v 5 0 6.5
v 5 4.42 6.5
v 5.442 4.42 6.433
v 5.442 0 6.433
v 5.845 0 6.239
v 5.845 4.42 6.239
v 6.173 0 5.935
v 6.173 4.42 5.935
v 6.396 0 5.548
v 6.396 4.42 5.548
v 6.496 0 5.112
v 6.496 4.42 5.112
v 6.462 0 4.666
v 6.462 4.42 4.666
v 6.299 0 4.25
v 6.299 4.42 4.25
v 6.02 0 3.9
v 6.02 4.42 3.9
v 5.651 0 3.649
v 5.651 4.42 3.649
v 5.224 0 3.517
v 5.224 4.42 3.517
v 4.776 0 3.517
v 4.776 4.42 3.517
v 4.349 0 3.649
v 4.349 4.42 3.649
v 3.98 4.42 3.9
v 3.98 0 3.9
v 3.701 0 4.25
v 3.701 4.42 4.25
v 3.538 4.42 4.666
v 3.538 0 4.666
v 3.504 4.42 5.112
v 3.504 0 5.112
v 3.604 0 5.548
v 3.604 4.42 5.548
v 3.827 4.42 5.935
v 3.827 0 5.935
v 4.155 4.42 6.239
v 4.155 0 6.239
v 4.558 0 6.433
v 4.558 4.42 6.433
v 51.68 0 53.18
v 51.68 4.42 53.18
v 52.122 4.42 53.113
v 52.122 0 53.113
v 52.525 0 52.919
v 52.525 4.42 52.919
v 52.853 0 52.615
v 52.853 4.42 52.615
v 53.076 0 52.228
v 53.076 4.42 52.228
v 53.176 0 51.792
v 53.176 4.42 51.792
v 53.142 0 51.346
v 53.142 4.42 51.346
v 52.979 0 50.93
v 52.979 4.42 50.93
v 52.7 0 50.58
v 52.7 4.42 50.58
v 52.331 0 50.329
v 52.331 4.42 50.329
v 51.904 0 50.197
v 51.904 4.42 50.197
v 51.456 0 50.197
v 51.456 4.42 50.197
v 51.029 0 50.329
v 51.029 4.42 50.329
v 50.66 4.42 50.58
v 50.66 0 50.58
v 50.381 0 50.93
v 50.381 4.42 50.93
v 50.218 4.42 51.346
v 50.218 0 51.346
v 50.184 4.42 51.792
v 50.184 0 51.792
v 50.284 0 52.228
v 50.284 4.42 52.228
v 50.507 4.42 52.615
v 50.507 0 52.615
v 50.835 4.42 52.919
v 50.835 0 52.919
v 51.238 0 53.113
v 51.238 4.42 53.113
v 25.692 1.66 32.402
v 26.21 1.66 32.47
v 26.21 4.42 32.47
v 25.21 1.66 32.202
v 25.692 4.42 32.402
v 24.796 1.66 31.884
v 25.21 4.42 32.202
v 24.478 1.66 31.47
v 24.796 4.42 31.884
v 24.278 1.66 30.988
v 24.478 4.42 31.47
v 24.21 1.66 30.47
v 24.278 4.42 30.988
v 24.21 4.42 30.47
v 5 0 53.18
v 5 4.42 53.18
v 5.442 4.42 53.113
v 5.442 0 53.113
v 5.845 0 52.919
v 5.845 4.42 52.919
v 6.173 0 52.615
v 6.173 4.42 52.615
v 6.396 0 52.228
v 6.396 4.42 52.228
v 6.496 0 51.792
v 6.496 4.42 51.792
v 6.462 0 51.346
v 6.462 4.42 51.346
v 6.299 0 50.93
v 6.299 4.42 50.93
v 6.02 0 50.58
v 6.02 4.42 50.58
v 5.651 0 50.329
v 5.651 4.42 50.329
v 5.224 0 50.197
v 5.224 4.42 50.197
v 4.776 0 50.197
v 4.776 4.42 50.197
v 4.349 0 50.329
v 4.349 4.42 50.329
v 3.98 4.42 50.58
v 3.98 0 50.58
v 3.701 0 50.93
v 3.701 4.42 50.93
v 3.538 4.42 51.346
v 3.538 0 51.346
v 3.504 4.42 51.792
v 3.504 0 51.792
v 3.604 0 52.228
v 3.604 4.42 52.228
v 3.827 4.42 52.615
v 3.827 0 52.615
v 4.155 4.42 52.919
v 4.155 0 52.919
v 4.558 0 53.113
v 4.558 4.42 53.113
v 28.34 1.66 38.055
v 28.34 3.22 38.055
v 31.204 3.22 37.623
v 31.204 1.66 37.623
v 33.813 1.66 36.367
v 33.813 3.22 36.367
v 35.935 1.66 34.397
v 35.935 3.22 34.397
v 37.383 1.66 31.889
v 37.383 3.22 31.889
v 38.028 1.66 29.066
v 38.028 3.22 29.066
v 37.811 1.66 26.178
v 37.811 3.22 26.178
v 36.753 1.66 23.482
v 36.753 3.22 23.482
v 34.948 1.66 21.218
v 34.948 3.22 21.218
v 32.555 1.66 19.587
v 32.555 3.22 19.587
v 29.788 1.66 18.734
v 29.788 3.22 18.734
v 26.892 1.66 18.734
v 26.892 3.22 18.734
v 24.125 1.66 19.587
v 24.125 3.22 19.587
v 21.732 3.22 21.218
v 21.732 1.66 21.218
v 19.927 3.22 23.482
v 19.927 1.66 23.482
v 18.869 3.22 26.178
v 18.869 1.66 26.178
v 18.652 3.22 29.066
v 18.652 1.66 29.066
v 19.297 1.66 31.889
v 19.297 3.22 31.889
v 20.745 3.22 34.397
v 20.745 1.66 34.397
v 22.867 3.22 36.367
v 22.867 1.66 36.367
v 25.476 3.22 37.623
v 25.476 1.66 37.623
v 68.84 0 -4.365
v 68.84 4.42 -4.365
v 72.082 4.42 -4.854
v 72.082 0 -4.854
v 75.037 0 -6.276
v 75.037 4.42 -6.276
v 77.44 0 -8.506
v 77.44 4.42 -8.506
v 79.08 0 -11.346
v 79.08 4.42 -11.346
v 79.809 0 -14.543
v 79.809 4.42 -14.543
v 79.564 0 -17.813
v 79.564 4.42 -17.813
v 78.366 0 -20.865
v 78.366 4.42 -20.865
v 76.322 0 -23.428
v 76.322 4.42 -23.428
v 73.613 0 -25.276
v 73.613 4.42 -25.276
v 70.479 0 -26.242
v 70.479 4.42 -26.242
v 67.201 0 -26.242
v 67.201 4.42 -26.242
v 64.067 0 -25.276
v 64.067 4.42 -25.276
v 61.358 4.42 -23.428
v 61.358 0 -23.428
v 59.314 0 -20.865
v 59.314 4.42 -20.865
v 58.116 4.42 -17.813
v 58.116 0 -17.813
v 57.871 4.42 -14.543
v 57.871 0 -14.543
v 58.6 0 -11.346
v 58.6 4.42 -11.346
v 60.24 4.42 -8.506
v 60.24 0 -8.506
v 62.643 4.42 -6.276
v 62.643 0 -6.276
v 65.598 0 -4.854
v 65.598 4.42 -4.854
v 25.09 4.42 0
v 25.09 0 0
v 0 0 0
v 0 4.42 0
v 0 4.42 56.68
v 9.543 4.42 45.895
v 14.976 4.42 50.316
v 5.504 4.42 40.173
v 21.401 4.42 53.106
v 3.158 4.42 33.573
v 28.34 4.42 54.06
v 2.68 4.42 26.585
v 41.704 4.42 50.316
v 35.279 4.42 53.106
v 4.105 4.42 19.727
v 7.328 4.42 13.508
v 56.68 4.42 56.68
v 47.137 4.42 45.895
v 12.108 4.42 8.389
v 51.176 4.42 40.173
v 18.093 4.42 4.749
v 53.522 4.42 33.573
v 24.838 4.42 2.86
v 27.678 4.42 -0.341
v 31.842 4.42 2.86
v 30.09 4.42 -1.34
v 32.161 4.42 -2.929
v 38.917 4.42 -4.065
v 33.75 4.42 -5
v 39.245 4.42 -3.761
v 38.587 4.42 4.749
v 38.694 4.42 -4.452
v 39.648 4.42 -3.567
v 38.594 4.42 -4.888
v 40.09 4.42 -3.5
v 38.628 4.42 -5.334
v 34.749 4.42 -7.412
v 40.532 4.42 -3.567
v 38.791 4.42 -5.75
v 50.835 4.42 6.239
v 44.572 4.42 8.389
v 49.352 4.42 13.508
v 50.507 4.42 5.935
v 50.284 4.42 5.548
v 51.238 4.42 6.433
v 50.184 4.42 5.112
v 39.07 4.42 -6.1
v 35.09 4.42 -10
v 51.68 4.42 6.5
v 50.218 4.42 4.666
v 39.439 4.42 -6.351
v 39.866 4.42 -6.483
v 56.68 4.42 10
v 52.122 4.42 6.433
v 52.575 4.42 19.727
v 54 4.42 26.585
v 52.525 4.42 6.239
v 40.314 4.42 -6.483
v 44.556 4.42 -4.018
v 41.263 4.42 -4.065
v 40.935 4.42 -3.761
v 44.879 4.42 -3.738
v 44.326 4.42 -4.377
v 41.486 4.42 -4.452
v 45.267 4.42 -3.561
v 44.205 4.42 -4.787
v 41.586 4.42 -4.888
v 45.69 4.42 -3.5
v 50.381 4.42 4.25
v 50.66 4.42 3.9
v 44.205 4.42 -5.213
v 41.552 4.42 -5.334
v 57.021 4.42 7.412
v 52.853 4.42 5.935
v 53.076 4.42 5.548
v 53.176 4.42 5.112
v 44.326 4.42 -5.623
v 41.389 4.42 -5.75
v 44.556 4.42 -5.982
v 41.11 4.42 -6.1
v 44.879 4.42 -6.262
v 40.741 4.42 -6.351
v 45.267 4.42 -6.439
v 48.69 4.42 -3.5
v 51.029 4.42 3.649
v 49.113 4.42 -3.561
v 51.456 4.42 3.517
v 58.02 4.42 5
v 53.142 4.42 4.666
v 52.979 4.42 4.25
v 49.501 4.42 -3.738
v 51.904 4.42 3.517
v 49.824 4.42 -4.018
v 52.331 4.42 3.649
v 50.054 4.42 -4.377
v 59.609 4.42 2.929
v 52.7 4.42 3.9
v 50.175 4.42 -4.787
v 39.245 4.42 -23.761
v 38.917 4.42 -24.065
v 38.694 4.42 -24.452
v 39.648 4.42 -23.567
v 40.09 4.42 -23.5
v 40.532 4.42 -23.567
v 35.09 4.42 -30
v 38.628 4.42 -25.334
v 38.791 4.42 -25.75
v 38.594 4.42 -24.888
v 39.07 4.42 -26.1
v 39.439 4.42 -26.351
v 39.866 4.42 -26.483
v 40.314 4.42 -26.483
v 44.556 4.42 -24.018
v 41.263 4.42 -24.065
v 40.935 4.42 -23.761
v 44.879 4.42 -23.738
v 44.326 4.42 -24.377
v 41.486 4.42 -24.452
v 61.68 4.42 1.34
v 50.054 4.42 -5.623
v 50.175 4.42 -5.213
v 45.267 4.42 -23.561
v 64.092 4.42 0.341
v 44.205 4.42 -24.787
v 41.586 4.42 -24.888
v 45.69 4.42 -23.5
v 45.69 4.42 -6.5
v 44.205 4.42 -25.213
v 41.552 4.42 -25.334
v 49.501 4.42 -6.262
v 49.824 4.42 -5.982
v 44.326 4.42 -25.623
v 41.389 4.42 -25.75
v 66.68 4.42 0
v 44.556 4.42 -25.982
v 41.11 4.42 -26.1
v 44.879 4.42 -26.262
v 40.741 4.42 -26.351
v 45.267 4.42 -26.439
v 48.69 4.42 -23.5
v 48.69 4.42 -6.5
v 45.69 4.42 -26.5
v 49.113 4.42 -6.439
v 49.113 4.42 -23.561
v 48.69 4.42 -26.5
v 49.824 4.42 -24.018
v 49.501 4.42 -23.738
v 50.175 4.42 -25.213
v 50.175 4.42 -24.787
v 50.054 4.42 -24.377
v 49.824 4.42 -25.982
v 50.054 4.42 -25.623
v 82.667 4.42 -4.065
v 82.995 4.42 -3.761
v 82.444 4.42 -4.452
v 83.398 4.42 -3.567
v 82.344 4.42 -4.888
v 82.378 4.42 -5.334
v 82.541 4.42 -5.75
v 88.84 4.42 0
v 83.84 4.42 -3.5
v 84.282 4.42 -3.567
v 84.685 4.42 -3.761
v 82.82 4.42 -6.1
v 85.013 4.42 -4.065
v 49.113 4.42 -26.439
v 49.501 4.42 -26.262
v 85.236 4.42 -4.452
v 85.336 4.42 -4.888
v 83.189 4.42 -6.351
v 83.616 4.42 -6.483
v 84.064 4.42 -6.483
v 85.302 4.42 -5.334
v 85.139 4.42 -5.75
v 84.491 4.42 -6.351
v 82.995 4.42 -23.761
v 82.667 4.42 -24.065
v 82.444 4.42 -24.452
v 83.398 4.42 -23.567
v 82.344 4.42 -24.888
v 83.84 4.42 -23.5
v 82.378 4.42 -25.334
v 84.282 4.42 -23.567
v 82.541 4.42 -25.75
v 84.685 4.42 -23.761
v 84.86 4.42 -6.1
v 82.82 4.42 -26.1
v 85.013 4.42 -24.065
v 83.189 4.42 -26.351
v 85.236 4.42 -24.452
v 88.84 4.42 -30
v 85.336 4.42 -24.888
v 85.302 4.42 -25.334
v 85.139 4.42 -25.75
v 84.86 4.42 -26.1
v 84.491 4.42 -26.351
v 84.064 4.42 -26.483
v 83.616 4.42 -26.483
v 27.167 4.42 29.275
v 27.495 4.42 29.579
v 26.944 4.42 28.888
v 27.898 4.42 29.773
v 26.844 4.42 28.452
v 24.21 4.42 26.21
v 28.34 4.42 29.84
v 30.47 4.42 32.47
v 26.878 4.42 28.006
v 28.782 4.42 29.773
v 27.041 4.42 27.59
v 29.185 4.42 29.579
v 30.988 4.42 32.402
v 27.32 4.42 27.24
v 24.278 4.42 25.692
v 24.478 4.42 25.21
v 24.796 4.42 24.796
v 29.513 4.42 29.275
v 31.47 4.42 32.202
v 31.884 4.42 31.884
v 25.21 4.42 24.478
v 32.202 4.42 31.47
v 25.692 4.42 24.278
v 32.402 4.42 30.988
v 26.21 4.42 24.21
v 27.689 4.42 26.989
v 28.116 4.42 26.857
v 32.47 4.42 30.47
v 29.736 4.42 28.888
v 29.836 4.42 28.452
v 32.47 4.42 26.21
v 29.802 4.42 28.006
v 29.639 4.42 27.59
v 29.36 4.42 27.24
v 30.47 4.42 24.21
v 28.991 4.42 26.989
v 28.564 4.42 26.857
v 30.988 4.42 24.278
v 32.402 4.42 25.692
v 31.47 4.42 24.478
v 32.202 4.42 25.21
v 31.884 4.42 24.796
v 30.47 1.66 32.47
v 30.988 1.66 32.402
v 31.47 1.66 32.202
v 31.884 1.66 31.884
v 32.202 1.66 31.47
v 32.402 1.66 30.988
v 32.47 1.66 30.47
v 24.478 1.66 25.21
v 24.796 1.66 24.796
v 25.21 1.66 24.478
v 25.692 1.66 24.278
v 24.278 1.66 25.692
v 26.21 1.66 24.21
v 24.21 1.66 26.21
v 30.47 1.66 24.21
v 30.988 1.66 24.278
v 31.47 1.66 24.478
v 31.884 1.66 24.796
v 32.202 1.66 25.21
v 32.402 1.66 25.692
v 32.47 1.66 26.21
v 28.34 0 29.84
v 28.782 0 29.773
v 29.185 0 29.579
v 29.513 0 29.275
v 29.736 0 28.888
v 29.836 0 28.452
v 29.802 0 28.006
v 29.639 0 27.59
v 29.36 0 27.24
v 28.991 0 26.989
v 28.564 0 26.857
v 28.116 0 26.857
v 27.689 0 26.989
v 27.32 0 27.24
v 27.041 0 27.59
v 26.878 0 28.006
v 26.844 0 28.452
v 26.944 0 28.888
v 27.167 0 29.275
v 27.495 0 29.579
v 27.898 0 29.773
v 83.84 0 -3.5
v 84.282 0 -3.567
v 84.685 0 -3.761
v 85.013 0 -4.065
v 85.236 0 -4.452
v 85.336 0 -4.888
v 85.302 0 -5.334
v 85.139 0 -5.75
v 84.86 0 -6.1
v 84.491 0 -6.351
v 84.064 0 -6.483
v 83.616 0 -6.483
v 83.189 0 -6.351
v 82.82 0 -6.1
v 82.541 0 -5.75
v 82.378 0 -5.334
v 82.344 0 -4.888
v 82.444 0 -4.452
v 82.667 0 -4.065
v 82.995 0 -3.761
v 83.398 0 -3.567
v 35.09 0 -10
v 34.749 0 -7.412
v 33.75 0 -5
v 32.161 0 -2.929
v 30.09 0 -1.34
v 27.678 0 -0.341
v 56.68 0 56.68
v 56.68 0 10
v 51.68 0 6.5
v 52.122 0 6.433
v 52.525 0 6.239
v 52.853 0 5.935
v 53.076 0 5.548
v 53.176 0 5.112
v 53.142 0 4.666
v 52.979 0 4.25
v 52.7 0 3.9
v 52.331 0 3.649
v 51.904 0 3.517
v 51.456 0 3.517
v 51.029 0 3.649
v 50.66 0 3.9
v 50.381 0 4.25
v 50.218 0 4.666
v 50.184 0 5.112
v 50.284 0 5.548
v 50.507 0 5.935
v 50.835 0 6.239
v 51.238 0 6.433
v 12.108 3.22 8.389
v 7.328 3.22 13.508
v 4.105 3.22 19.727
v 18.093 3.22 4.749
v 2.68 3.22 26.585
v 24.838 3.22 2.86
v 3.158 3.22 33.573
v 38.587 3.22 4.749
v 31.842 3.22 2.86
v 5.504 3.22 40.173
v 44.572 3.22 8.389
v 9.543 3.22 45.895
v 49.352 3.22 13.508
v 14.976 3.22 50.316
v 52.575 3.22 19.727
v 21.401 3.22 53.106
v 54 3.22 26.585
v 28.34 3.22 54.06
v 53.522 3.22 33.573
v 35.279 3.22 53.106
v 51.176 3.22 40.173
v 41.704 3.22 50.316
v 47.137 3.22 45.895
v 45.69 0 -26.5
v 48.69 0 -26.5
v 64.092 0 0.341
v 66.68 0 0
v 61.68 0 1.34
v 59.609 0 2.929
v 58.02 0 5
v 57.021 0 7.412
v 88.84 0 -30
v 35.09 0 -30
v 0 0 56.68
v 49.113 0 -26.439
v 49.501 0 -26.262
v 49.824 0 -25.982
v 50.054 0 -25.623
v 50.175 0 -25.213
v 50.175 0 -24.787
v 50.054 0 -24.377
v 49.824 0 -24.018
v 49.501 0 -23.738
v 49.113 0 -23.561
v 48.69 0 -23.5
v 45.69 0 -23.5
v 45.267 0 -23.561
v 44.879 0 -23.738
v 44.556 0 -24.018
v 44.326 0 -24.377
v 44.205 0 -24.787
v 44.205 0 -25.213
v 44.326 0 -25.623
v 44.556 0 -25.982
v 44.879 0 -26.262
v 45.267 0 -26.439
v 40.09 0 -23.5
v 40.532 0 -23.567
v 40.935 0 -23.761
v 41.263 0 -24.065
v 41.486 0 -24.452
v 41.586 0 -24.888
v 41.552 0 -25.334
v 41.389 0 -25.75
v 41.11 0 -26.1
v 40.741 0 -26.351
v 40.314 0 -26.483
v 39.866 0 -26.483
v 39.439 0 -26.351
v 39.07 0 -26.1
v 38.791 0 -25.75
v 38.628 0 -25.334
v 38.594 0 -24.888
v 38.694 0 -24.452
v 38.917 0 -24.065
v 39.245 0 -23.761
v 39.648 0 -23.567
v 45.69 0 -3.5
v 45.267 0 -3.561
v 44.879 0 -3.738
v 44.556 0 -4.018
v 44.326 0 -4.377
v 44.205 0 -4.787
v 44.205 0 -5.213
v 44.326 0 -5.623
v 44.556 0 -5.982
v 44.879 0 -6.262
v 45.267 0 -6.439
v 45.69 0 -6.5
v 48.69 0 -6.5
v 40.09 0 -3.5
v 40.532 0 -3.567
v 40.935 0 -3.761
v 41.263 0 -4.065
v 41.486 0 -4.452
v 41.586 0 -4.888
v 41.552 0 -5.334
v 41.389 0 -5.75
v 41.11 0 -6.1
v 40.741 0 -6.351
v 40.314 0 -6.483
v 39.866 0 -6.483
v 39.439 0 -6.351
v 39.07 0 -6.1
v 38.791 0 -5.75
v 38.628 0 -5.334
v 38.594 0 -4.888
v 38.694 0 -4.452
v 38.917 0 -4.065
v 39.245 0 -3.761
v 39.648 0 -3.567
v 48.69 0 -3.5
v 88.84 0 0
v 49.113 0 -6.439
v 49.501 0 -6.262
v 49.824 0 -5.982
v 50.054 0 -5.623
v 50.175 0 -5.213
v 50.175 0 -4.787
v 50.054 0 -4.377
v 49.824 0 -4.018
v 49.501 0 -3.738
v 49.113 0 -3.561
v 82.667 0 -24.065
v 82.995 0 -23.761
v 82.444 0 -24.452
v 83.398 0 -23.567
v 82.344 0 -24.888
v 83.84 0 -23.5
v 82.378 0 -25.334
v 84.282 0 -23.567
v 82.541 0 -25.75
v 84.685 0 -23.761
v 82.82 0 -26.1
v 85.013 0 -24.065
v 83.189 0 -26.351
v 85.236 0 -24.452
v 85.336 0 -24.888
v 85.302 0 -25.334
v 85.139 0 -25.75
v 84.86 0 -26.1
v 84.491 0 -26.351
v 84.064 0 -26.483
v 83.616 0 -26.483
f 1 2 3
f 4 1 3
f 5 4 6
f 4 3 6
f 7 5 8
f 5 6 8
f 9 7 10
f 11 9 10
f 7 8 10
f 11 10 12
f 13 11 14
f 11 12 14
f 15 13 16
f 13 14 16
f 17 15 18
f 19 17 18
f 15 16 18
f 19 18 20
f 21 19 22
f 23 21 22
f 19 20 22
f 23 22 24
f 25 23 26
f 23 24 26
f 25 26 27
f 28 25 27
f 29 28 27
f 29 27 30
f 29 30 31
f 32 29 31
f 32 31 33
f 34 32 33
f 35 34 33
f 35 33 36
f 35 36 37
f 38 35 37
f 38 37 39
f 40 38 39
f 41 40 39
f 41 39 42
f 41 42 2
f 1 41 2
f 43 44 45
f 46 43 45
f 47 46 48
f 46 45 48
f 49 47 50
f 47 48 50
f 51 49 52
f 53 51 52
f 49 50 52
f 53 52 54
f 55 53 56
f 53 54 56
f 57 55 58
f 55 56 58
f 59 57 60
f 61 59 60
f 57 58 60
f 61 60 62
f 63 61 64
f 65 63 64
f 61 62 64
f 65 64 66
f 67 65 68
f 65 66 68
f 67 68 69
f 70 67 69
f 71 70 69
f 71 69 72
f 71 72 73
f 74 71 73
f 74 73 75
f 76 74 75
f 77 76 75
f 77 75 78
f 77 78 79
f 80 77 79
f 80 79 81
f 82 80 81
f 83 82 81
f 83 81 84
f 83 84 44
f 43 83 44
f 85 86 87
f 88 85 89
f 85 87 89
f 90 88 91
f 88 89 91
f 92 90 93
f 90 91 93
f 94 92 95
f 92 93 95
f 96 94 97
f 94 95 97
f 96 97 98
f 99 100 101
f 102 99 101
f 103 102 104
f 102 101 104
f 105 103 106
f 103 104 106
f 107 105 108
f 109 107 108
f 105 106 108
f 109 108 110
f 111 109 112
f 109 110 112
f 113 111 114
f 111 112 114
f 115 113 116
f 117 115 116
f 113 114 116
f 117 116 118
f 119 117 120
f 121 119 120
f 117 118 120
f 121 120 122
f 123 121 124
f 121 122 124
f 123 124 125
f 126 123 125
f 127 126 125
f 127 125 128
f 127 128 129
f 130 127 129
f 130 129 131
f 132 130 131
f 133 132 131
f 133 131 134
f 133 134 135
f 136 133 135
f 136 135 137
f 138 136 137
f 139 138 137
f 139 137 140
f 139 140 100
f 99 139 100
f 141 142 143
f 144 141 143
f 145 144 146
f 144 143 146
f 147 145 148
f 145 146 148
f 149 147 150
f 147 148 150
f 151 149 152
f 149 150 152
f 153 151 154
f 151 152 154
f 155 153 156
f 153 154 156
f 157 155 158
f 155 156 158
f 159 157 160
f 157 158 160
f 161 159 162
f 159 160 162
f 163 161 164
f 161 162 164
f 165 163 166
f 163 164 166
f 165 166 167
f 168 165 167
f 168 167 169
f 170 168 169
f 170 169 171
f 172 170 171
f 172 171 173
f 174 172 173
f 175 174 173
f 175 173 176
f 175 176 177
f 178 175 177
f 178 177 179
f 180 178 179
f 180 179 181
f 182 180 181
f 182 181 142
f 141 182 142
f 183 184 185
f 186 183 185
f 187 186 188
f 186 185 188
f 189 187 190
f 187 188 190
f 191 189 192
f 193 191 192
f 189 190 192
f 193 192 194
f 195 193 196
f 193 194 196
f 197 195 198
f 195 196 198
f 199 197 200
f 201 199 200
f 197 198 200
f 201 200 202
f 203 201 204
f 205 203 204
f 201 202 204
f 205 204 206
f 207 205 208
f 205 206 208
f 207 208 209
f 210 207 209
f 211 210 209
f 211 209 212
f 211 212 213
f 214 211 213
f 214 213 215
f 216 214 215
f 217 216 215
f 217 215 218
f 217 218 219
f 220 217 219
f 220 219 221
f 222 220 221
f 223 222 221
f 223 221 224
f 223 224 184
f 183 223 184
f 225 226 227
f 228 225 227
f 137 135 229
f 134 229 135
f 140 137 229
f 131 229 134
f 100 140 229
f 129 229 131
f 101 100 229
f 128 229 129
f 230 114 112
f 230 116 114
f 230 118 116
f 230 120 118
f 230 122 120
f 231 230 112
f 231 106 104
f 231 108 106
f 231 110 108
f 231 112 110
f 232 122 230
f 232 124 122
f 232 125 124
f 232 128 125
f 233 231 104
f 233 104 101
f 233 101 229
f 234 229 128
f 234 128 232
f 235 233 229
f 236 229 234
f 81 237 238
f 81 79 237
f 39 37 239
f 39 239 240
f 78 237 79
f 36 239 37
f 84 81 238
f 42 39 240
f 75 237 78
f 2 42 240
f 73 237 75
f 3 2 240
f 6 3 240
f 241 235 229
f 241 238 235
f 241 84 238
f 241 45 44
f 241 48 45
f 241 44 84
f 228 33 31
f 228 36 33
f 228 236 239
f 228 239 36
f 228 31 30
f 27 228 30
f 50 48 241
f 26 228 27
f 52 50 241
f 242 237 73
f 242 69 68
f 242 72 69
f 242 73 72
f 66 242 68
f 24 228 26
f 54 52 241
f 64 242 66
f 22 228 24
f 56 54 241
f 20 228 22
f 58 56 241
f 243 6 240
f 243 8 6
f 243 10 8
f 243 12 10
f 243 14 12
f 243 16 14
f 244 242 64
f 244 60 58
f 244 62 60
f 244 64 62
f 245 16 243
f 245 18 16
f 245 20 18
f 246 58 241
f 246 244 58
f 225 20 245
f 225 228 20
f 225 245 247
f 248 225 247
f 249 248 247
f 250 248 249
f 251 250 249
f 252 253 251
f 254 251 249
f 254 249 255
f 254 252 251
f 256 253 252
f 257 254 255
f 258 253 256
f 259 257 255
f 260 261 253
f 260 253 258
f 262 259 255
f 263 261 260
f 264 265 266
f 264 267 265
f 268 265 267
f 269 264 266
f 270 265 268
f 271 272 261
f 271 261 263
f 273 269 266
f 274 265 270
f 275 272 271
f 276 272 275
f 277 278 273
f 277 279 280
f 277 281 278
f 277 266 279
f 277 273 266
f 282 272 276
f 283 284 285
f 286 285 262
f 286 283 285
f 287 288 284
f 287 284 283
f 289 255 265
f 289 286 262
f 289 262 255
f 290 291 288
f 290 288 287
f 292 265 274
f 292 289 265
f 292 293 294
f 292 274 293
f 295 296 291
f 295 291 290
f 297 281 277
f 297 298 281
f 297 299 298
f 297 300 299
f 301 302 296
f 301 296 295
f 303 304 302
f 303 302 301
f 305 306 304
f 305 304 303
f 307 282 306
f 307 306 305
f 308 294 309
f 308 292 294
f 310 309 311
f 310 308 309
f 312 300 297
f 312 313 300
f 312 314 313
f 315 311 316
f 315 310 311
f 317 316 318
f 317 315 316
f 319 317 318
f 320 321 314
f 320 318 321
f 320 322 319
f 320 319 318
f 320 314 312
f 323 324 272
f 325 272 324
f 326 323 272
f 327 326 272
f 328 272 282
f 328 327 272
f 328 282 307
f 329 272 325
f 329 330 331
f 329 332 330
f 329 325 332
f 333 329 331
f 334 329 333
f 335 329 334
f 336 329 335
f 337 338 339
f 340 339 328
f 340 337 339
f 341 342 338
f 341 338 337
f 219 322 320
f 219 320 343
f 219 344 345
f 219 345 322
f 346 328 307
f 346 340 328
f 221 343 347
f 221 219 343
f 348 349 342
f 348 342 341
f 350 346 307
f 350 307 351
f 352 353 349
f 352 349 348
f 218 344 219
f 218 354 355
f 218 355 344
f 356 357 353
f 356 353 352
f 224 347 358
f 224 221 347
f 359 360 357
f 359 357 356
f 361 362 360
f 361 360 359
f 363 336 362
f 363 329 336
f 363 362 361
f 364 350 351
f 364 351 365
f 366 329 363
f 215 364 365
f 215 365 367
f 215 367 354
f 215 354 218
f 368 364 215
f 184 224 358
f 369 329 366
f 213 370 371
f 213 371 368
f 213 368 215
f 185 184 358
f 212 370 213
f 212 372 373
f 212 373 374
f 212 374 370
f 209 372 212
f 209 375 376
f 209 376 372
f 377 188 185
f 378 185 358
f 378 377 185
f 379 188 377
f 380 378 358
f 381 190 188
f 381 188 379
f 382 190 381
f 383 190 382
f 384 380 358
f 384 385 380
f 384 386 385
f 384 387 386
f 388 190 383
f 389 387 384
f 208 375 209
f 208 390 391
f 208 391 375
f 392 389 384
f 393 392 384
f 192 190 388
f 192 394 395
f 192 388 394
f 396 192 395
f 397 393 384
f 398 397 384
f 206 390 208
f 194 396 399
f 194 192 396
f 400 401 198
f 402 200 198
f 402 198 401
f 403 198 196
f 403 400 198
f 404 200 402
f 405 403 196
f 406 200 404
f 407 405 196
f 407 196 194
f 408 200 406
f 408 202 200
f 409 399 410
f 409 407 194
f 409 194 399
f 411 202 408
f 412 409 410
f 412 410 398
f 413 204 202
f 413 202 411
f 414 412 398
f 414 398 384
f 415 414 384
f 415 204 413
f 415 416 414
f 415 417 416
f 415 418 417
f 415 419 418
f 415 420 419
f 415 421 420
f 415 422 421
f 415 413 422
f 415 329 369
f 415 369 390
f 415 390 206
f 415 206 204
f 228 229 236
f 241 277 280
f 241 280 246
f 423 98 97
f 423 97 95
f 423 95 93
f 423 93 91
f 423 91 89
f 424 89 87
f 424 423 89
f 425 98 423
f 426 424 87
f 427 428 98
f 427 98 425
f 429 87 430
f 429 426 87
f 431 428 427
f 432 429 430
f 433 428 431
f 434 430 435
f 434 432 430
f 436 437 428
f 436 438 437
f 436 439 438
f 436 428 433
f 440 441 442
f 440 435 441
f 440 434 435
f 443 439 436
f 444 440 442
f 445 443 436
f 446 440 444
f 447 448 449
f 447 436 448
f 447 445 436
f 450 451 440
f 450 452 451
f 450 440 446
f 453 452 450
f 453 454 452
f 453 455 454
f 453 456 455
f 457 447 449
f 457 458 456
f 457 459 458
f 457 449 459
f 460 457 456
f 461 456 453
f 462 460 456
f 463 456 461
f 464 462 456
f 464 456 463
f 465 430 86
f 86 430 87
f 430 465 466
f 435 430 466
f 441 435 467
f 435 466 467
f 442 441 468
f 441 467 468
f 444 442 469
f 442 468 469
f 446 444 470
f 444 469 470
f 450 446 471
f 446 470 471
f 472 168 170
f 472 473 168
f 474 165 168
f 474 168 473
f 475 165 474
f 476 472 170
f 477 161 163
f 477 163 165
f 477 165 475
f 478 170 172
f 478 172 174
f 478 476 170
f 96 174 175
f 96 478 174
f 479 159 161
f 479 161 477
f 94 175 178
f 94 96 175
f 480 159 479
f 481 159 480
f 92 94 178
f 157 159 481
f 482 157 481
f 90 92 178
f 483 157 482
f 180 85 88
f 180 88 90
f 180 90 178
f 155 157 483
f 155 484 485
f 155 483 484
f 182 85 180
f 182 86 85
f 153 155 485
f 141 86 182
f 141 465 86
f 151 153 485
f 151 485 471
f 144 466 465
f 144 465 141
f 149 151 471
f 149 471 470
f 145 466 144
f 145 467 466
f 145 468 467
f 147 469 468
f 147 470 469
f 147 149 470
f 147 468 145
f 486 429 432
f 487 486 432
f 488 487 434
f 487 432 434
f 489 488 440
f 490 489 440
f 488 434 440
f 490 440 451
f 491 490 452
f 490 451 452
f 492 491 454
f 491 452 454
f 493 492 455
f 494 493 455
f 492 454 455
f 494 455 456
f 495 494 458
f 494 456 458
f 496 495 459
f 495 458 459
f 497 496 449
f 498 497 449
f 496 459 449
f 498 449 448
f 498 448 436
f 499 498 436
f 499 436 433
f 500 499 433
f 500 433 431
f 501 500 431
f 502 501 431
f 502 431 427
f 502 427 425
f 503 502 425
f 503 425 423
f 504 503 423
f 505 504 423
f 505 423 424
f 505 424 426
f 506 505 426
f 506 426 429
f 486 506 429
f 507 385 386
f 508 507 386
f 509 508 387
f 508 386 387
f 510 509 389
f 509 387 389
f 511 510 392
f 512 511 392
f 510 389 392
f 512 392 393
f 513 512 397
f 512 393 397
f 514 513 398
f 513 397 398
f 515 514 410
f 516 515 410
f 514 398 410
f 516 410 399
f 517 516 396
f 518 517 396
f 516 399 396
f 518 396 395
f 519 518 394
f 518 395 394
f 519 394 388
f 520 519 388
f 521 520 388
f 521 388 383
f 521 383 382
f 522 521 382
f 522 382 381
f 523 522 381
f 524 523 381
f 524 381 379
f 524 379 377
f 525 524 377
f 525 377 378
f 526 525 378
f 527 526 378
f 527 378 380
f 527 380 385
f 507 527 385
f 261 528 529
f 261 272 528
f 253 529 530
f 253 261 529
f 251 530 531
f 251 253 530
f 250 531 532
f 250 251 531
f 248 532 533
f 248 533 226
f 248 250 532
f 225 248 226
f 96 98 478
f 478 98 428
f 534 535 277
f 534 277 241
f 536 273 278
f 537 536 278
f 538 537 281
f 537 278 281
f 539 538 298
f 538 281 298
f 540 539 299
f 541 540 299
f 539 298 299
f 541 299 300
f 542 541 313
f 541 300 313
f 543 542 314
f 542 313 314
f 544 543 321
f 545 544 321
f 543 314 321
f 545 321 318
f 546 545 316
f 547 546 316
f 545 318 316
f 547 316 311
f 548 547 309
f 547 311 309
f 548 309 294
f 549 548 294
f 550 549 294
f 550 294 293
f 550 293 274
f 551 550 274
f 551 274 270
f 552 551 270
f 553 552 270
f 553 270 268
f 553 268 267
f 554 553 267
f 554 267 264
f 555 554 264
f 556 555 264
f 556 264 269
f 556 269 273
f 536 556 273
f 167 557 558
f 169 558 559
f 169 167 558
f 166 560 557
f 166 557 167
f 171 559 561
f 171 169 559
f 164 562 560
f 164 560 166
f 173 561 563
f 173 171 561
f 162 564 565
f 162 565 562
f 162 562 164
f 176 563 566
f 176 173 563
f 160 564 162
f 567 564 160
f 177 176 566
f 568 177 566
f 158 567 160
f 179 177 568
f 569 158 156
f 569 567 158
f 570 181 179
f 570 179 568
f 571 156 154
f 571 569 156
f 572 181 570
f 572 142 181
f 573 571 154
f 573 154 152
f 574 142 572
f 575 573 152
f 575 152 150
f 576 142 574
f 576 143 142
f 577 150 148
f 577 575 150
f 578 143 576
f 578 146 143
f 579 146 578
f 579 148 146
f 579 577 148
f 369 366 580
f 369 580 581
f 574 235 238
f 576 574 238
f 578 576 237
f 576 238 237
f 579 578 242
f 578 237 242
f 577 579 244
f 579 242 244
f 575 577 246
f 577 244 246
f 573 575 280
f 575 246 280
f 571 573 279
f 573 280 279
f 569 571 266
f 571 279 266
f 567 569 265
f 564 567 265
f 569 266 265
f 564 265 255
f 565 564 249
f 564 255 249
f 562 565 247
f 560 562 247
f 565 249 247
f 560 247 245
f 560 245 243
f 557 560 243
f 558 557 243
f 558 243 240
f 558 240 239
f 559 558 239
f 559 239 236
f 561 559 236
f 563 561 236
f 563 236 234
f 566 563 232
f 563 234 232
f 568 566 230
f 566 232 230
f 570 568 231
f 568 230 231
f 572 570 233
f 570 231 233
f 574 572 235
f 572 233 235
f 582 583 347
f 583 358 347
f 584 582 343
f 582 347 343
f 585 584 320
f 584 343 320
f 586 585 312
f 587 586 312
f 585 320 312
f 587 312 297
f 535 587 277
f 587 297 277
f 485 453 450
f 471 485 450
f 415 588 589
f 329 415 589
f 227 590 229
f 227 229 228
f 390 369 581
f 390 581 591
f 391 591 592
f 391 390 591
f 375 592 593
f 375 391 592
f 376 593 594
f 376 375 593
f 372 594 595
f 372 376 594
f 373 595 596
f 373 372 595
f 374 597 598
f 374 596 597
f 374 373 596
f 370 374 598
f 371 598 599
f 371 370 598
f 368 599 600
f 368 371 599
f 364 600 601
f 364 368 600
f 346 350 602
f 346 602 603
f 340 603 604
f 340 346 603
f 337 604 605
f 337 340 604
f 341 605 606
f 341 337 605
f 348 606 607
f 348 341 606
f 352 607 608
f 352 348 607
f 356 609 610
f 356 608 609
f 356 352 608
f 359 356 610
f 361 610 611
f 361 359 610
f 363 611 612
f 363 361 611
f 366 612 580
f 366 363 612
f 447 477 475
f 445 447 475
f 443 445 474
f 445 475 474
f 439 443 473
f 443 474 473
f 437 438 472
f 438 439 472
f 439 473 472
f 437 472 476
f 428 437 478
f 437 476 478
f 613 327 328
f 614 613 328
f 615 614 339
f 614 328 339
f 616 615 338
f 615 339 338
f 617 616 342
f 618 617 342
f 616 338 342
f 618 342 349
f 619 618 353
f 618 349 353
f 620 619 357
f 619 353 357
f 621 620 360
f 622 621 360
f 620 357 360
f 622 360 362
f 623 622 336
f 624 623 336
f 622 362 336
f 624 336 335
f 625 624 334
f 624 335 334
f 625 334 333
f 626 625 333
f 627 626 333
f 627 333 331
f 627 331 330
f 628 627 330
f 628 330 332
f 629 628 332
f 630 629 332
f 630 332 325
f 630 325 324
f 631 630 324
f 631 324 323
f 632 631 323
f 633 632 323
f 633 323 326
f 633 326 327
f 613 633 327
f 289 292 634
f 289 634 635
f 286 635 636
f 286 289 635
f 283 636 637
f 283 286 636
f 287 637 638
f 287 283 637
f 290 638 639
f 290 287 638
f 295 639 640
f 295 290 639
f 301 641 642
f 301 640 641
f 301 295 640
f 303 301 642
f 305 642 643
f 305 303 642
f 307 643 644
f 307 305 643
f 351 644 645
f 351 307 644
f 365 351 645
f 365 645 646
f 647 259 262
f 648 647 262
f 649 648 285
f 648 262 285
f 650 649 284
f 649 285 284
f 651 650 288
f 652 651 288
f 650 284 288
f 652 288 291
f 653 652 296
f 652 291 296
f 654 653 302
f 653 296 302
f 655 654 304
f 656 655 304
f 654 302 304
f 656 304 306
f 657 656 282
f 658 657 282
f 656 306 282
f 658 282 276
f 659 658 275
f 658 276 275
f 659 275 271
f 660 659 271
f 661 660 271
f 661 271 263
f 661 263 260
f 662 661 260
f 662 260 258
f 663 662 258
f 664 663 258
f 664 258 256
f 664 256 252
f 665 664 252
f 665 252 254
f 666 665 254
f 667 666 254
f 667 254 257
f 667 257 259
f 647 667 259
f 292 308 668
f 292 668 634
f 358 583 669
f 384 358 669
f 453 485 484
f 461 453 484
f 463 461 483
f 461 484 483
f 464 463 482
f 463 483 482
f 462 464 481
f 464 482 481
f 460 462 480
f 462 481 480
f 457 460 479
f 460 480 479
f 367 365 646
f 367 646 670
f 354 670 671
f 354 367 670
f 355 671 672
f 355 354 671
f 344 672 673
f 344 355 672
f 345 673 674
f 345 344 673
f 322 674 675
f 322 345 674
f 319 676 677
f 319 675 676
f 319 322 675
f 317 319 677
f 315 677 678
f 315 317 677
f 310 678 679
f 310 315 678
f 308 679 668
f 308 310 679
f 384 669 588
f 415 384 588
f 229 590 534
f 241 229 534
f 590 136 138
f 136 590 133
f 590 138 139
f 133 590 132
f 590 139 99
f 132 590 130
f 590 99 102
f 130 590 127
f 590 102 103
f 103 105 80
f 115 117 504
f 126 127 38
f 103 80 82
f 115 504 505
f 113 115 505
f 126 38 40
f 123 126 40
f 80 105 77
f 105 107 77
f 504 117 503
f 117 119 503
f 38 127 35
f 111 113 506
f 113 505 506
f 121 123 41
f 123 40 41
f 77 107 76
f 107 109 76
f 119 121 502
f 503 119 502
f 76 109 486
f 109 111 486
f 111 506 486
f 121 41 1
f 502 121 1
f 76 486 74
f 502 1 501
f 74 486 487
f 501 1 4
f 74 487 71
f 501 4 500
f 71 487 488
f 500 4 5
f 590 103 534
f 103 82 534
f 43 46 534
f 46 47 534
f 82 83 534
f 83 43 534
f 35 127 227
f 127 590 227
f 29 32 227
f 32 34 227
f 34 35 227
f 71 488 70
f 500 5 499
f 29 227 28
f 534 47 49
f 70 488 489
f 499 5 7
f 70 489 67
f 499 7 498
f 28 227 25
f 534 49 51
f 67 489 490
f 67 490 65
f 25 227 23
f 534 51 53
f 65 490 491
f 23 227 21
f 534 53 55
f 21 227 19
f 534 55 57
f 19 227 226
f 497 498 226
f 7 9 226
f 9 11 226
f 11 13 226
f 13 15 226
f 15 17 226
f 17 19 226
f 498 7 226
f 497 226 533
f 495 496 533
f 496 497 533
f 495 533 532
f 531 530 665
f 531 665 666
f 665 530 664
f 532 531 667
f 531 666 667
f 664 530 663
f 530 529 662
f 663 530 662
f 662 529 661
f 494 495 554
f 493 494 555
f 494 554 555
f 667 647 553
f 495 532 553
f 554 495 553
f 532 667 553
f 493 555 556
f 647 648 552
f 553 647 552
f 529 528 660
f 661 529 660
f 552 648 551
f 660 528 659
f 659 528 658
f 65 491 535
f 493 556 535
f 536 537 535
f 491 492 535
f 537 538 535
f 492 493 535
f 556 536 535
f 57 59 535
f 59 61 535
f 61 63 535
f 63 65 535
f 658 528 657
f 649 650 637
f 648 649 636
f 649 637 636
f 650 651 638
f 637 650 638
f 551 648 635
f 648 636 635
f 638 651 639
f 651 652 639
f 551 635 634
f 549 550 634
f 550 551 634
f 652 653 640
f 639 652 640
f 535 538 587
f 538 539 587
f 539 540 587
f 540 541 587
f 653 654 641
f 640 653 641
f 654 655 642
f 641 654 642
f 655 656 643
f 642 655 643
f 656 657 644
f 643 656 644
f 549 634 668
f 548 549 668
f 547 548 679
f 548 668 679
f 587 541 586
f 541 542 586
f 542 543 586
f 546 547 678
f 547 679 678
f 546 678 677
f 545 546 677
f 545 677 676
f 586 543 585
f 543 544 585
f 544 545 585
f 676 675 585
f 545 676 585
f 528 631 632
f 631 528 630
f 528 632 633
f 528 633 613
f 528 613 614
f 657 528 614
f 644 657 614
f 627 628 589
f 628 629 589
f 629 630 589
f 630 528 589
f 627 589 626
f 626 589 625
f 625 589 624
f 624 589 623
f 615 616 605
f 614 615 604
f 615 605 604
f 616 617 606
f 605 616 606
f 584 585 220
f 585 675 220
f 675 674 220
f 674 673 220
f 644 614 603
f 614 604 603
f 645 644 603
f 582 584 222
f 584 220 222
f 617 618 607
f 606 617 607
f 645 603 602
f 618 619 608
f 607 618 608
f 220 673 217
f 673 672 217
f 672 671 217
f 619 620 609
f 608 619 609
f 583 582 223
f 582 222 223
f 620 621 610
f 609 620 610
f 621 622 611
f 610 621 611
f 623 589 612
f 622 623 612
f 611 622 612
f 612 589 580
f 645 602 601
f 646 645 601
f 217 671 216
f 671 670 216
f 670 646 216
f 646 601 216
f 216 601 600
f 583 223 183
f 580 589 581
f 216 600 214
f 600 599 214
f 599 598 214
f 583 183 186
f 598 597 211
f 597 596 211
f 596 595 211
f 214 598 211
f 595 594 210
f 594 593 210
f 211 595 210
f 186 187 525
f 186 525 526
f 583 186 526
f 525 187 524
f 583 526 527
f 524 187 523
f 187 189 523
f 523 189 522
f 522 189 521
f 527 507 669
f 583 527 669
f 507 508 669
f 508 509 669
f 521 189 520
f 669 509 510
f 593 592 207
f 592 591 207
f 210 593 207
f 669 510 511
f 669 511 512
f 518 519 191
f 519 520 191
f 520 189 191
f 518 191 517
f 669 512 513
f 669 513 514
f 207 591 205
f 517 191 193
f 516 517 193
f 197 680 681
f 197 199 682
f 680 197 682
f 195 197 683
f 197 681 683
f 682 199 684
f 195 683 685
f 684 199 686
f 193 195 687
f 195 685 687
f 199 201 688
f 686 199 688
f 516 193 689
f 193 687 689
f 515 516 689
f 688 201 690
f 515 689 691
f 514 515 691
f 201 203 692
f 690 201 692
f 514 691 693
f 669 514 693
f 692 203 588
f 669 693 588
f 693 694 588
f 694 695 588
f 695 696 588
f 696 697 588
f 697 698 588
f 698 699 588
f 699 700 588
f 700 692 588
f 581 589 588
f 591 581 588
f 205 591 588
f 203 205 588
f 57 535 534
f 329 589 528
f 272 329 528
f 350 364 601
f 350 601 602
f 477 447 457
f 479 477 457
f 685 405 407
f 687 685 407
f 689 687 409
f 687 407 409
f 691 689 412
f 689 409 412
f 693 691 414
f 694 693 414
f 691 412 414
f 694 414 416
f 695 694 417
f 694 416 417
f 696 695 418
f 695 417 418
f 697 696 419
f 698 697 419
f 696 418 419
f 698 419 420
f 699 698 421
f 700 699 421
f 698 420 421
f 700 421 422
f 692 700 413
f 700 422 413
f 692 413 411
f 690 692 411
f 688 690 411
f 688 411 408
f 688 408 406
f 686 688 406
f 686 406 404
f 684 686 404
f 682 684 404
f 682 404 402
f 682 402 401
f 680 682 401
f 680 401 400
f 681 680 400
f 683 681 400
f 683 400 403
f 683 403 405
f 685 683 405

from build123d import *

# Parameters (mm, degrees)
BOSS_EXTRUDE3_DEPTH = 4.42
BOSS_EXTRUDE4_DEPTH = 4.42
SKETCH7_W           = 4.13
SKETCH7_H           = 4.13
BOSS_EXTRUDE5_DEPTH = 0.7
SKETCH7_3_R         = 25.72
SKETCH7_3_R_2       = 16.51
SKETCH7_3_R_3       = 9.715
CUT_EXTRUDE1_DEPTH  = 1.2
SKETCH7_4_R         = 9.715
CUT_EXTRUDE2_DEPTH  = 2.76
FILLET2_R           = 2
SKETCH8_R           = 1.5
CUT_EXTRUDE3_DEPTH  = 106.505366688
SKETCH9_R           = 1.5
CUT_EXTRUDE4_DEPTH  = 106.473714261
SKETCH10_R          = 1.5
CUT_EXTRUDE5_DEPTH  = 106.473714261
SKETCH11_R          = 11
CUT_EXTRUDE6_DEPTH  = 106.473714261
FILLET7_R           = 10
SKETCH12_W          = 8.26
SKETCH12_H          = 8.26
CUT_EXTRUDE7_DEPTH  = 0.7


with BuildPart() as part:
    # Sketch6 → Boss-Extrude3 (new body)
    with BuildSketch(Plane(origin=(0, 0, 0), x_dir=(1, 0, 0), z_dir=(0, 1, 0))):
        Polygon((0, 0), (35.09, 0), (56.68, 0), (56.68, -56.68), (35.09, -56.68), (0, -56.68), align=None)
    extrude(amount=BOSS_EXTRUDE3_DEPTH)

    # Sketch6<7> → Boss-Extrude4 (add)
    with BuildSketch(Plane(origin=(0, 0, 0), x_dir=(1, 0, 0), z_dir=(0, 1, 0))):
        Polygon((35.09, 0), (56.68, 0), (88.84, 0), (88.84, 30), (35.09, 30), align=None)
    extrude(amount=BOSS_EXTRUDE4_DEPTH)

    # Sketch7 → Boss-Extrude5 (add)
    with BuildSketch(Plane(origin=(0, 4.42, 0), x_dir=(1, 0, 0), z_dir=(0, 1, 0))):
        with Locations((26.275, -30.405)):
            Rectangle(SKETCH7_W, SKETCH7_H)
        with Locations((26.275, -26.275)):
            Rectangle(SKETCH7_W, SKETCH7_H)
        with Locations((30.405, -26.275)):
            Rectangle(SKETCH7_W, SKETCH7_H)
        with Locations((30.405, -30.405)):
            Rectangle(SKETCH7_W, SKETCH7_H)
    extrude(amount=BOSS_EXTRUDE5_DEPTH)

    # Sketch7<3> → Cut-Extrude1 (cut)
    # profile 1 of 2: a face of its own
    with BuildSketch(Plane(origin=(0, 4.42, 0), x_dir=(1, 0, 0), z_dir=(0, 1, 0))):
        with Locations(Location((28.34, -28.34, 0), (0, 0, 270))):
            Circle(SKETCH7_3_R)
        with Locations((28.34, -28.34)):
            Circle(SKETCH7_3_R_2, mode=Mode.SUBTRACT)
    # profile 2 of 2: a face of its own
    with BuildSketch(Plane(origin=(0, 4.42, 0), x_dir=(1, 0, 0), z_dir=(0, 1, 0))):
        with Locations((28.34, -28.34)):
            Circle(SKETCH7_3_R_2)
        with Locations(Location((28.34, -28.34, 0), (0, 0, 270))):
            Circle(SKETCH7_3_R_3, mode=Mode.SUBTRACT)
    extrude(amount=-CUT_EXTRUDE1_DEPTH, mode=Mode.SUBTRACT)

    # Sketch7<4> → Cut-Extrude2 (cut)
    with BuildSketch(Plane(origin=(0, 4.42, 0), x_dir=(1, 0, 0), z_dir=(0, 1, 0))):
        with Locations(Location((28.34, -28.34, 0), (0, 0, 270))):
            Circle(SKETCH7_4_R)
        Polygon((24.21, -28.34), (24.21, -32.47), (28.34, -32.47), (32.47, -32.47), (32.47, -28.34), (32.47, -24.21), (28.34, -24.21), (24.21, -24.21), align=None, mode=Mode.SUBTRACT)
    extrude(amount=-CUT_EXTRUDE2_DEPTH, mode=Mode.SUBTRACT)

    # Fillet2
    fillet2_edges = [part.edges().sort_by_distance(p)[0] for p in [
        (32.47, 3.39, 32.47),
        (32.47, 3.39, 24.21),
        (24.21, 3.39, 24.21),
        (24.21, 3.39, 32.47),
    ]]
    fillet(fillet2_edges, radius=FILLET2_R)

    # Sketch8 → Cut-Extrude3 (cut, through all)
    with BuildSketch(Plane(origin=(0, 5.12, 0), x_dir=(1, 0, 0), z_dir=(0, 1, 0))):
        with Locations(Location((28.34, -28.34, 0), (0, 0, 270))):
            Circle(SKETCH8_R)
    extrude(amount=-CUT_EXTRUDE3_DEPTH, mode=Mode.SUBTRACT)

    # Sketch9 → Cut-Extrude4 (cut, through all)
    with BuildSketch(Plane(origin=(0, 4.42, 0), x_dir=(1, 0, 0), z_dir=(0, 1, 0))):
        with Locations(Location((5, -5, 0), (0, 0, 270))):
            Circle(SKETCH9_R)
        with Locations(Location((51.68, -5, 0), (0, 0, 270))):
            Circle(SKETCH9_R)
        with Locations(Location((51.68, -51.68, 0), (0, 0, 270))):
            Circle(SKETCH9_R)
        with Locations(Location((5, -51.68, 0), (0, 0, 270))):
            Circle(SKETCH9_R)
    extrude(amount=-CUT_EXTRUDE4_DEPTH, mode=Mode.SUBTRACT)

    # Sketch10 → Cut-Extrude5 (cut, through all)
    with BuildSketch(Plane(origin=(0, 4.42, 0), x_dir=(1, 0, 0), z_dir=(0, 1, 0))):
        with Locations(Location((40.09, 25, 0), (0, 0, 270))):
            Circle(SKETCH10_R)
        with Locations(Location((40.09, 5, 0), (0, 0, 270))):
            Circle(SKETCH10_R)
        with Locations(Location((83.84, 5, 0), (0, 0, 270))):
            Circle(SKETCH10_R)
        with Locations(Location((83.84, 25, 0), (0, 0, 270))):
            Circle(SKETCH10_R)
        with BuildLine():
            Line((45.69, 26.5), (48.69, 26.5))
            ThreePointArc((48.69, 26.5), (50.19, 25), (48.69, 23.5))
            Line((48.69, 23.5), (45.69, 23.5))
            ThreePointArc((45.69, 23.5), (44.19, 25), (45.69, 26.5))
        make_face()
        with BuildLine():
            Line((45.69, 6.5), (48.69, 6.5))
            ThreePointArc((48.69, 6.5), (50.19, 5), (48.69, 3.5))
            Line((48.69, 3.5), (45.69, 3.5))
            ThreePointArc((45.69, 3.5), (44.19, 5), (45.69, 6.5))
        make_face()
    extrude(amount=-CUT_EXTRUDE5_DEPTH, mode=Mode.SUBTRACT)

    # Sketch11 → Cut-Extrude6 (cut, through all)
    with BuildSketch(Plane(origin=(0, 4.42, 0), x_dir=(1, 0, 0), z_dir=(0, 1, 0))):
        with Locations(Location((68.84, 15.364869593, 0), (0, 0, 270))):
            Circle(SKETCH11_R)
    extrude(amount=-CUT_EXTRUDE6_DEPTH, mode=Mode.SUBTRACT)

    # Fillet7
    fillet7_edges = [part.edges().sort_by_distance(p)[0] for p in [
        (35.09, 2.21, 0),
        (56.68, 2.21, 0),
    ]]
    fillet(fillet7_edges, radius=FILLET7_R)

    # Sketch12 → Cut-Extrude7 (cut)
    with BuildSketch(Plane(origin=(0, 5.12, 0), x_dir=(1, 0, 0), z_dir=(0, 1, 0))):
        with Locations((28.34, -28.34)):
            Rectangle(SKETCH12_W, SKETCH12_H)
    extrude(amount=-CUT_EXTRUDE7_DEPTH, mode=Mode.SUBTRACT)


solid = part.part
